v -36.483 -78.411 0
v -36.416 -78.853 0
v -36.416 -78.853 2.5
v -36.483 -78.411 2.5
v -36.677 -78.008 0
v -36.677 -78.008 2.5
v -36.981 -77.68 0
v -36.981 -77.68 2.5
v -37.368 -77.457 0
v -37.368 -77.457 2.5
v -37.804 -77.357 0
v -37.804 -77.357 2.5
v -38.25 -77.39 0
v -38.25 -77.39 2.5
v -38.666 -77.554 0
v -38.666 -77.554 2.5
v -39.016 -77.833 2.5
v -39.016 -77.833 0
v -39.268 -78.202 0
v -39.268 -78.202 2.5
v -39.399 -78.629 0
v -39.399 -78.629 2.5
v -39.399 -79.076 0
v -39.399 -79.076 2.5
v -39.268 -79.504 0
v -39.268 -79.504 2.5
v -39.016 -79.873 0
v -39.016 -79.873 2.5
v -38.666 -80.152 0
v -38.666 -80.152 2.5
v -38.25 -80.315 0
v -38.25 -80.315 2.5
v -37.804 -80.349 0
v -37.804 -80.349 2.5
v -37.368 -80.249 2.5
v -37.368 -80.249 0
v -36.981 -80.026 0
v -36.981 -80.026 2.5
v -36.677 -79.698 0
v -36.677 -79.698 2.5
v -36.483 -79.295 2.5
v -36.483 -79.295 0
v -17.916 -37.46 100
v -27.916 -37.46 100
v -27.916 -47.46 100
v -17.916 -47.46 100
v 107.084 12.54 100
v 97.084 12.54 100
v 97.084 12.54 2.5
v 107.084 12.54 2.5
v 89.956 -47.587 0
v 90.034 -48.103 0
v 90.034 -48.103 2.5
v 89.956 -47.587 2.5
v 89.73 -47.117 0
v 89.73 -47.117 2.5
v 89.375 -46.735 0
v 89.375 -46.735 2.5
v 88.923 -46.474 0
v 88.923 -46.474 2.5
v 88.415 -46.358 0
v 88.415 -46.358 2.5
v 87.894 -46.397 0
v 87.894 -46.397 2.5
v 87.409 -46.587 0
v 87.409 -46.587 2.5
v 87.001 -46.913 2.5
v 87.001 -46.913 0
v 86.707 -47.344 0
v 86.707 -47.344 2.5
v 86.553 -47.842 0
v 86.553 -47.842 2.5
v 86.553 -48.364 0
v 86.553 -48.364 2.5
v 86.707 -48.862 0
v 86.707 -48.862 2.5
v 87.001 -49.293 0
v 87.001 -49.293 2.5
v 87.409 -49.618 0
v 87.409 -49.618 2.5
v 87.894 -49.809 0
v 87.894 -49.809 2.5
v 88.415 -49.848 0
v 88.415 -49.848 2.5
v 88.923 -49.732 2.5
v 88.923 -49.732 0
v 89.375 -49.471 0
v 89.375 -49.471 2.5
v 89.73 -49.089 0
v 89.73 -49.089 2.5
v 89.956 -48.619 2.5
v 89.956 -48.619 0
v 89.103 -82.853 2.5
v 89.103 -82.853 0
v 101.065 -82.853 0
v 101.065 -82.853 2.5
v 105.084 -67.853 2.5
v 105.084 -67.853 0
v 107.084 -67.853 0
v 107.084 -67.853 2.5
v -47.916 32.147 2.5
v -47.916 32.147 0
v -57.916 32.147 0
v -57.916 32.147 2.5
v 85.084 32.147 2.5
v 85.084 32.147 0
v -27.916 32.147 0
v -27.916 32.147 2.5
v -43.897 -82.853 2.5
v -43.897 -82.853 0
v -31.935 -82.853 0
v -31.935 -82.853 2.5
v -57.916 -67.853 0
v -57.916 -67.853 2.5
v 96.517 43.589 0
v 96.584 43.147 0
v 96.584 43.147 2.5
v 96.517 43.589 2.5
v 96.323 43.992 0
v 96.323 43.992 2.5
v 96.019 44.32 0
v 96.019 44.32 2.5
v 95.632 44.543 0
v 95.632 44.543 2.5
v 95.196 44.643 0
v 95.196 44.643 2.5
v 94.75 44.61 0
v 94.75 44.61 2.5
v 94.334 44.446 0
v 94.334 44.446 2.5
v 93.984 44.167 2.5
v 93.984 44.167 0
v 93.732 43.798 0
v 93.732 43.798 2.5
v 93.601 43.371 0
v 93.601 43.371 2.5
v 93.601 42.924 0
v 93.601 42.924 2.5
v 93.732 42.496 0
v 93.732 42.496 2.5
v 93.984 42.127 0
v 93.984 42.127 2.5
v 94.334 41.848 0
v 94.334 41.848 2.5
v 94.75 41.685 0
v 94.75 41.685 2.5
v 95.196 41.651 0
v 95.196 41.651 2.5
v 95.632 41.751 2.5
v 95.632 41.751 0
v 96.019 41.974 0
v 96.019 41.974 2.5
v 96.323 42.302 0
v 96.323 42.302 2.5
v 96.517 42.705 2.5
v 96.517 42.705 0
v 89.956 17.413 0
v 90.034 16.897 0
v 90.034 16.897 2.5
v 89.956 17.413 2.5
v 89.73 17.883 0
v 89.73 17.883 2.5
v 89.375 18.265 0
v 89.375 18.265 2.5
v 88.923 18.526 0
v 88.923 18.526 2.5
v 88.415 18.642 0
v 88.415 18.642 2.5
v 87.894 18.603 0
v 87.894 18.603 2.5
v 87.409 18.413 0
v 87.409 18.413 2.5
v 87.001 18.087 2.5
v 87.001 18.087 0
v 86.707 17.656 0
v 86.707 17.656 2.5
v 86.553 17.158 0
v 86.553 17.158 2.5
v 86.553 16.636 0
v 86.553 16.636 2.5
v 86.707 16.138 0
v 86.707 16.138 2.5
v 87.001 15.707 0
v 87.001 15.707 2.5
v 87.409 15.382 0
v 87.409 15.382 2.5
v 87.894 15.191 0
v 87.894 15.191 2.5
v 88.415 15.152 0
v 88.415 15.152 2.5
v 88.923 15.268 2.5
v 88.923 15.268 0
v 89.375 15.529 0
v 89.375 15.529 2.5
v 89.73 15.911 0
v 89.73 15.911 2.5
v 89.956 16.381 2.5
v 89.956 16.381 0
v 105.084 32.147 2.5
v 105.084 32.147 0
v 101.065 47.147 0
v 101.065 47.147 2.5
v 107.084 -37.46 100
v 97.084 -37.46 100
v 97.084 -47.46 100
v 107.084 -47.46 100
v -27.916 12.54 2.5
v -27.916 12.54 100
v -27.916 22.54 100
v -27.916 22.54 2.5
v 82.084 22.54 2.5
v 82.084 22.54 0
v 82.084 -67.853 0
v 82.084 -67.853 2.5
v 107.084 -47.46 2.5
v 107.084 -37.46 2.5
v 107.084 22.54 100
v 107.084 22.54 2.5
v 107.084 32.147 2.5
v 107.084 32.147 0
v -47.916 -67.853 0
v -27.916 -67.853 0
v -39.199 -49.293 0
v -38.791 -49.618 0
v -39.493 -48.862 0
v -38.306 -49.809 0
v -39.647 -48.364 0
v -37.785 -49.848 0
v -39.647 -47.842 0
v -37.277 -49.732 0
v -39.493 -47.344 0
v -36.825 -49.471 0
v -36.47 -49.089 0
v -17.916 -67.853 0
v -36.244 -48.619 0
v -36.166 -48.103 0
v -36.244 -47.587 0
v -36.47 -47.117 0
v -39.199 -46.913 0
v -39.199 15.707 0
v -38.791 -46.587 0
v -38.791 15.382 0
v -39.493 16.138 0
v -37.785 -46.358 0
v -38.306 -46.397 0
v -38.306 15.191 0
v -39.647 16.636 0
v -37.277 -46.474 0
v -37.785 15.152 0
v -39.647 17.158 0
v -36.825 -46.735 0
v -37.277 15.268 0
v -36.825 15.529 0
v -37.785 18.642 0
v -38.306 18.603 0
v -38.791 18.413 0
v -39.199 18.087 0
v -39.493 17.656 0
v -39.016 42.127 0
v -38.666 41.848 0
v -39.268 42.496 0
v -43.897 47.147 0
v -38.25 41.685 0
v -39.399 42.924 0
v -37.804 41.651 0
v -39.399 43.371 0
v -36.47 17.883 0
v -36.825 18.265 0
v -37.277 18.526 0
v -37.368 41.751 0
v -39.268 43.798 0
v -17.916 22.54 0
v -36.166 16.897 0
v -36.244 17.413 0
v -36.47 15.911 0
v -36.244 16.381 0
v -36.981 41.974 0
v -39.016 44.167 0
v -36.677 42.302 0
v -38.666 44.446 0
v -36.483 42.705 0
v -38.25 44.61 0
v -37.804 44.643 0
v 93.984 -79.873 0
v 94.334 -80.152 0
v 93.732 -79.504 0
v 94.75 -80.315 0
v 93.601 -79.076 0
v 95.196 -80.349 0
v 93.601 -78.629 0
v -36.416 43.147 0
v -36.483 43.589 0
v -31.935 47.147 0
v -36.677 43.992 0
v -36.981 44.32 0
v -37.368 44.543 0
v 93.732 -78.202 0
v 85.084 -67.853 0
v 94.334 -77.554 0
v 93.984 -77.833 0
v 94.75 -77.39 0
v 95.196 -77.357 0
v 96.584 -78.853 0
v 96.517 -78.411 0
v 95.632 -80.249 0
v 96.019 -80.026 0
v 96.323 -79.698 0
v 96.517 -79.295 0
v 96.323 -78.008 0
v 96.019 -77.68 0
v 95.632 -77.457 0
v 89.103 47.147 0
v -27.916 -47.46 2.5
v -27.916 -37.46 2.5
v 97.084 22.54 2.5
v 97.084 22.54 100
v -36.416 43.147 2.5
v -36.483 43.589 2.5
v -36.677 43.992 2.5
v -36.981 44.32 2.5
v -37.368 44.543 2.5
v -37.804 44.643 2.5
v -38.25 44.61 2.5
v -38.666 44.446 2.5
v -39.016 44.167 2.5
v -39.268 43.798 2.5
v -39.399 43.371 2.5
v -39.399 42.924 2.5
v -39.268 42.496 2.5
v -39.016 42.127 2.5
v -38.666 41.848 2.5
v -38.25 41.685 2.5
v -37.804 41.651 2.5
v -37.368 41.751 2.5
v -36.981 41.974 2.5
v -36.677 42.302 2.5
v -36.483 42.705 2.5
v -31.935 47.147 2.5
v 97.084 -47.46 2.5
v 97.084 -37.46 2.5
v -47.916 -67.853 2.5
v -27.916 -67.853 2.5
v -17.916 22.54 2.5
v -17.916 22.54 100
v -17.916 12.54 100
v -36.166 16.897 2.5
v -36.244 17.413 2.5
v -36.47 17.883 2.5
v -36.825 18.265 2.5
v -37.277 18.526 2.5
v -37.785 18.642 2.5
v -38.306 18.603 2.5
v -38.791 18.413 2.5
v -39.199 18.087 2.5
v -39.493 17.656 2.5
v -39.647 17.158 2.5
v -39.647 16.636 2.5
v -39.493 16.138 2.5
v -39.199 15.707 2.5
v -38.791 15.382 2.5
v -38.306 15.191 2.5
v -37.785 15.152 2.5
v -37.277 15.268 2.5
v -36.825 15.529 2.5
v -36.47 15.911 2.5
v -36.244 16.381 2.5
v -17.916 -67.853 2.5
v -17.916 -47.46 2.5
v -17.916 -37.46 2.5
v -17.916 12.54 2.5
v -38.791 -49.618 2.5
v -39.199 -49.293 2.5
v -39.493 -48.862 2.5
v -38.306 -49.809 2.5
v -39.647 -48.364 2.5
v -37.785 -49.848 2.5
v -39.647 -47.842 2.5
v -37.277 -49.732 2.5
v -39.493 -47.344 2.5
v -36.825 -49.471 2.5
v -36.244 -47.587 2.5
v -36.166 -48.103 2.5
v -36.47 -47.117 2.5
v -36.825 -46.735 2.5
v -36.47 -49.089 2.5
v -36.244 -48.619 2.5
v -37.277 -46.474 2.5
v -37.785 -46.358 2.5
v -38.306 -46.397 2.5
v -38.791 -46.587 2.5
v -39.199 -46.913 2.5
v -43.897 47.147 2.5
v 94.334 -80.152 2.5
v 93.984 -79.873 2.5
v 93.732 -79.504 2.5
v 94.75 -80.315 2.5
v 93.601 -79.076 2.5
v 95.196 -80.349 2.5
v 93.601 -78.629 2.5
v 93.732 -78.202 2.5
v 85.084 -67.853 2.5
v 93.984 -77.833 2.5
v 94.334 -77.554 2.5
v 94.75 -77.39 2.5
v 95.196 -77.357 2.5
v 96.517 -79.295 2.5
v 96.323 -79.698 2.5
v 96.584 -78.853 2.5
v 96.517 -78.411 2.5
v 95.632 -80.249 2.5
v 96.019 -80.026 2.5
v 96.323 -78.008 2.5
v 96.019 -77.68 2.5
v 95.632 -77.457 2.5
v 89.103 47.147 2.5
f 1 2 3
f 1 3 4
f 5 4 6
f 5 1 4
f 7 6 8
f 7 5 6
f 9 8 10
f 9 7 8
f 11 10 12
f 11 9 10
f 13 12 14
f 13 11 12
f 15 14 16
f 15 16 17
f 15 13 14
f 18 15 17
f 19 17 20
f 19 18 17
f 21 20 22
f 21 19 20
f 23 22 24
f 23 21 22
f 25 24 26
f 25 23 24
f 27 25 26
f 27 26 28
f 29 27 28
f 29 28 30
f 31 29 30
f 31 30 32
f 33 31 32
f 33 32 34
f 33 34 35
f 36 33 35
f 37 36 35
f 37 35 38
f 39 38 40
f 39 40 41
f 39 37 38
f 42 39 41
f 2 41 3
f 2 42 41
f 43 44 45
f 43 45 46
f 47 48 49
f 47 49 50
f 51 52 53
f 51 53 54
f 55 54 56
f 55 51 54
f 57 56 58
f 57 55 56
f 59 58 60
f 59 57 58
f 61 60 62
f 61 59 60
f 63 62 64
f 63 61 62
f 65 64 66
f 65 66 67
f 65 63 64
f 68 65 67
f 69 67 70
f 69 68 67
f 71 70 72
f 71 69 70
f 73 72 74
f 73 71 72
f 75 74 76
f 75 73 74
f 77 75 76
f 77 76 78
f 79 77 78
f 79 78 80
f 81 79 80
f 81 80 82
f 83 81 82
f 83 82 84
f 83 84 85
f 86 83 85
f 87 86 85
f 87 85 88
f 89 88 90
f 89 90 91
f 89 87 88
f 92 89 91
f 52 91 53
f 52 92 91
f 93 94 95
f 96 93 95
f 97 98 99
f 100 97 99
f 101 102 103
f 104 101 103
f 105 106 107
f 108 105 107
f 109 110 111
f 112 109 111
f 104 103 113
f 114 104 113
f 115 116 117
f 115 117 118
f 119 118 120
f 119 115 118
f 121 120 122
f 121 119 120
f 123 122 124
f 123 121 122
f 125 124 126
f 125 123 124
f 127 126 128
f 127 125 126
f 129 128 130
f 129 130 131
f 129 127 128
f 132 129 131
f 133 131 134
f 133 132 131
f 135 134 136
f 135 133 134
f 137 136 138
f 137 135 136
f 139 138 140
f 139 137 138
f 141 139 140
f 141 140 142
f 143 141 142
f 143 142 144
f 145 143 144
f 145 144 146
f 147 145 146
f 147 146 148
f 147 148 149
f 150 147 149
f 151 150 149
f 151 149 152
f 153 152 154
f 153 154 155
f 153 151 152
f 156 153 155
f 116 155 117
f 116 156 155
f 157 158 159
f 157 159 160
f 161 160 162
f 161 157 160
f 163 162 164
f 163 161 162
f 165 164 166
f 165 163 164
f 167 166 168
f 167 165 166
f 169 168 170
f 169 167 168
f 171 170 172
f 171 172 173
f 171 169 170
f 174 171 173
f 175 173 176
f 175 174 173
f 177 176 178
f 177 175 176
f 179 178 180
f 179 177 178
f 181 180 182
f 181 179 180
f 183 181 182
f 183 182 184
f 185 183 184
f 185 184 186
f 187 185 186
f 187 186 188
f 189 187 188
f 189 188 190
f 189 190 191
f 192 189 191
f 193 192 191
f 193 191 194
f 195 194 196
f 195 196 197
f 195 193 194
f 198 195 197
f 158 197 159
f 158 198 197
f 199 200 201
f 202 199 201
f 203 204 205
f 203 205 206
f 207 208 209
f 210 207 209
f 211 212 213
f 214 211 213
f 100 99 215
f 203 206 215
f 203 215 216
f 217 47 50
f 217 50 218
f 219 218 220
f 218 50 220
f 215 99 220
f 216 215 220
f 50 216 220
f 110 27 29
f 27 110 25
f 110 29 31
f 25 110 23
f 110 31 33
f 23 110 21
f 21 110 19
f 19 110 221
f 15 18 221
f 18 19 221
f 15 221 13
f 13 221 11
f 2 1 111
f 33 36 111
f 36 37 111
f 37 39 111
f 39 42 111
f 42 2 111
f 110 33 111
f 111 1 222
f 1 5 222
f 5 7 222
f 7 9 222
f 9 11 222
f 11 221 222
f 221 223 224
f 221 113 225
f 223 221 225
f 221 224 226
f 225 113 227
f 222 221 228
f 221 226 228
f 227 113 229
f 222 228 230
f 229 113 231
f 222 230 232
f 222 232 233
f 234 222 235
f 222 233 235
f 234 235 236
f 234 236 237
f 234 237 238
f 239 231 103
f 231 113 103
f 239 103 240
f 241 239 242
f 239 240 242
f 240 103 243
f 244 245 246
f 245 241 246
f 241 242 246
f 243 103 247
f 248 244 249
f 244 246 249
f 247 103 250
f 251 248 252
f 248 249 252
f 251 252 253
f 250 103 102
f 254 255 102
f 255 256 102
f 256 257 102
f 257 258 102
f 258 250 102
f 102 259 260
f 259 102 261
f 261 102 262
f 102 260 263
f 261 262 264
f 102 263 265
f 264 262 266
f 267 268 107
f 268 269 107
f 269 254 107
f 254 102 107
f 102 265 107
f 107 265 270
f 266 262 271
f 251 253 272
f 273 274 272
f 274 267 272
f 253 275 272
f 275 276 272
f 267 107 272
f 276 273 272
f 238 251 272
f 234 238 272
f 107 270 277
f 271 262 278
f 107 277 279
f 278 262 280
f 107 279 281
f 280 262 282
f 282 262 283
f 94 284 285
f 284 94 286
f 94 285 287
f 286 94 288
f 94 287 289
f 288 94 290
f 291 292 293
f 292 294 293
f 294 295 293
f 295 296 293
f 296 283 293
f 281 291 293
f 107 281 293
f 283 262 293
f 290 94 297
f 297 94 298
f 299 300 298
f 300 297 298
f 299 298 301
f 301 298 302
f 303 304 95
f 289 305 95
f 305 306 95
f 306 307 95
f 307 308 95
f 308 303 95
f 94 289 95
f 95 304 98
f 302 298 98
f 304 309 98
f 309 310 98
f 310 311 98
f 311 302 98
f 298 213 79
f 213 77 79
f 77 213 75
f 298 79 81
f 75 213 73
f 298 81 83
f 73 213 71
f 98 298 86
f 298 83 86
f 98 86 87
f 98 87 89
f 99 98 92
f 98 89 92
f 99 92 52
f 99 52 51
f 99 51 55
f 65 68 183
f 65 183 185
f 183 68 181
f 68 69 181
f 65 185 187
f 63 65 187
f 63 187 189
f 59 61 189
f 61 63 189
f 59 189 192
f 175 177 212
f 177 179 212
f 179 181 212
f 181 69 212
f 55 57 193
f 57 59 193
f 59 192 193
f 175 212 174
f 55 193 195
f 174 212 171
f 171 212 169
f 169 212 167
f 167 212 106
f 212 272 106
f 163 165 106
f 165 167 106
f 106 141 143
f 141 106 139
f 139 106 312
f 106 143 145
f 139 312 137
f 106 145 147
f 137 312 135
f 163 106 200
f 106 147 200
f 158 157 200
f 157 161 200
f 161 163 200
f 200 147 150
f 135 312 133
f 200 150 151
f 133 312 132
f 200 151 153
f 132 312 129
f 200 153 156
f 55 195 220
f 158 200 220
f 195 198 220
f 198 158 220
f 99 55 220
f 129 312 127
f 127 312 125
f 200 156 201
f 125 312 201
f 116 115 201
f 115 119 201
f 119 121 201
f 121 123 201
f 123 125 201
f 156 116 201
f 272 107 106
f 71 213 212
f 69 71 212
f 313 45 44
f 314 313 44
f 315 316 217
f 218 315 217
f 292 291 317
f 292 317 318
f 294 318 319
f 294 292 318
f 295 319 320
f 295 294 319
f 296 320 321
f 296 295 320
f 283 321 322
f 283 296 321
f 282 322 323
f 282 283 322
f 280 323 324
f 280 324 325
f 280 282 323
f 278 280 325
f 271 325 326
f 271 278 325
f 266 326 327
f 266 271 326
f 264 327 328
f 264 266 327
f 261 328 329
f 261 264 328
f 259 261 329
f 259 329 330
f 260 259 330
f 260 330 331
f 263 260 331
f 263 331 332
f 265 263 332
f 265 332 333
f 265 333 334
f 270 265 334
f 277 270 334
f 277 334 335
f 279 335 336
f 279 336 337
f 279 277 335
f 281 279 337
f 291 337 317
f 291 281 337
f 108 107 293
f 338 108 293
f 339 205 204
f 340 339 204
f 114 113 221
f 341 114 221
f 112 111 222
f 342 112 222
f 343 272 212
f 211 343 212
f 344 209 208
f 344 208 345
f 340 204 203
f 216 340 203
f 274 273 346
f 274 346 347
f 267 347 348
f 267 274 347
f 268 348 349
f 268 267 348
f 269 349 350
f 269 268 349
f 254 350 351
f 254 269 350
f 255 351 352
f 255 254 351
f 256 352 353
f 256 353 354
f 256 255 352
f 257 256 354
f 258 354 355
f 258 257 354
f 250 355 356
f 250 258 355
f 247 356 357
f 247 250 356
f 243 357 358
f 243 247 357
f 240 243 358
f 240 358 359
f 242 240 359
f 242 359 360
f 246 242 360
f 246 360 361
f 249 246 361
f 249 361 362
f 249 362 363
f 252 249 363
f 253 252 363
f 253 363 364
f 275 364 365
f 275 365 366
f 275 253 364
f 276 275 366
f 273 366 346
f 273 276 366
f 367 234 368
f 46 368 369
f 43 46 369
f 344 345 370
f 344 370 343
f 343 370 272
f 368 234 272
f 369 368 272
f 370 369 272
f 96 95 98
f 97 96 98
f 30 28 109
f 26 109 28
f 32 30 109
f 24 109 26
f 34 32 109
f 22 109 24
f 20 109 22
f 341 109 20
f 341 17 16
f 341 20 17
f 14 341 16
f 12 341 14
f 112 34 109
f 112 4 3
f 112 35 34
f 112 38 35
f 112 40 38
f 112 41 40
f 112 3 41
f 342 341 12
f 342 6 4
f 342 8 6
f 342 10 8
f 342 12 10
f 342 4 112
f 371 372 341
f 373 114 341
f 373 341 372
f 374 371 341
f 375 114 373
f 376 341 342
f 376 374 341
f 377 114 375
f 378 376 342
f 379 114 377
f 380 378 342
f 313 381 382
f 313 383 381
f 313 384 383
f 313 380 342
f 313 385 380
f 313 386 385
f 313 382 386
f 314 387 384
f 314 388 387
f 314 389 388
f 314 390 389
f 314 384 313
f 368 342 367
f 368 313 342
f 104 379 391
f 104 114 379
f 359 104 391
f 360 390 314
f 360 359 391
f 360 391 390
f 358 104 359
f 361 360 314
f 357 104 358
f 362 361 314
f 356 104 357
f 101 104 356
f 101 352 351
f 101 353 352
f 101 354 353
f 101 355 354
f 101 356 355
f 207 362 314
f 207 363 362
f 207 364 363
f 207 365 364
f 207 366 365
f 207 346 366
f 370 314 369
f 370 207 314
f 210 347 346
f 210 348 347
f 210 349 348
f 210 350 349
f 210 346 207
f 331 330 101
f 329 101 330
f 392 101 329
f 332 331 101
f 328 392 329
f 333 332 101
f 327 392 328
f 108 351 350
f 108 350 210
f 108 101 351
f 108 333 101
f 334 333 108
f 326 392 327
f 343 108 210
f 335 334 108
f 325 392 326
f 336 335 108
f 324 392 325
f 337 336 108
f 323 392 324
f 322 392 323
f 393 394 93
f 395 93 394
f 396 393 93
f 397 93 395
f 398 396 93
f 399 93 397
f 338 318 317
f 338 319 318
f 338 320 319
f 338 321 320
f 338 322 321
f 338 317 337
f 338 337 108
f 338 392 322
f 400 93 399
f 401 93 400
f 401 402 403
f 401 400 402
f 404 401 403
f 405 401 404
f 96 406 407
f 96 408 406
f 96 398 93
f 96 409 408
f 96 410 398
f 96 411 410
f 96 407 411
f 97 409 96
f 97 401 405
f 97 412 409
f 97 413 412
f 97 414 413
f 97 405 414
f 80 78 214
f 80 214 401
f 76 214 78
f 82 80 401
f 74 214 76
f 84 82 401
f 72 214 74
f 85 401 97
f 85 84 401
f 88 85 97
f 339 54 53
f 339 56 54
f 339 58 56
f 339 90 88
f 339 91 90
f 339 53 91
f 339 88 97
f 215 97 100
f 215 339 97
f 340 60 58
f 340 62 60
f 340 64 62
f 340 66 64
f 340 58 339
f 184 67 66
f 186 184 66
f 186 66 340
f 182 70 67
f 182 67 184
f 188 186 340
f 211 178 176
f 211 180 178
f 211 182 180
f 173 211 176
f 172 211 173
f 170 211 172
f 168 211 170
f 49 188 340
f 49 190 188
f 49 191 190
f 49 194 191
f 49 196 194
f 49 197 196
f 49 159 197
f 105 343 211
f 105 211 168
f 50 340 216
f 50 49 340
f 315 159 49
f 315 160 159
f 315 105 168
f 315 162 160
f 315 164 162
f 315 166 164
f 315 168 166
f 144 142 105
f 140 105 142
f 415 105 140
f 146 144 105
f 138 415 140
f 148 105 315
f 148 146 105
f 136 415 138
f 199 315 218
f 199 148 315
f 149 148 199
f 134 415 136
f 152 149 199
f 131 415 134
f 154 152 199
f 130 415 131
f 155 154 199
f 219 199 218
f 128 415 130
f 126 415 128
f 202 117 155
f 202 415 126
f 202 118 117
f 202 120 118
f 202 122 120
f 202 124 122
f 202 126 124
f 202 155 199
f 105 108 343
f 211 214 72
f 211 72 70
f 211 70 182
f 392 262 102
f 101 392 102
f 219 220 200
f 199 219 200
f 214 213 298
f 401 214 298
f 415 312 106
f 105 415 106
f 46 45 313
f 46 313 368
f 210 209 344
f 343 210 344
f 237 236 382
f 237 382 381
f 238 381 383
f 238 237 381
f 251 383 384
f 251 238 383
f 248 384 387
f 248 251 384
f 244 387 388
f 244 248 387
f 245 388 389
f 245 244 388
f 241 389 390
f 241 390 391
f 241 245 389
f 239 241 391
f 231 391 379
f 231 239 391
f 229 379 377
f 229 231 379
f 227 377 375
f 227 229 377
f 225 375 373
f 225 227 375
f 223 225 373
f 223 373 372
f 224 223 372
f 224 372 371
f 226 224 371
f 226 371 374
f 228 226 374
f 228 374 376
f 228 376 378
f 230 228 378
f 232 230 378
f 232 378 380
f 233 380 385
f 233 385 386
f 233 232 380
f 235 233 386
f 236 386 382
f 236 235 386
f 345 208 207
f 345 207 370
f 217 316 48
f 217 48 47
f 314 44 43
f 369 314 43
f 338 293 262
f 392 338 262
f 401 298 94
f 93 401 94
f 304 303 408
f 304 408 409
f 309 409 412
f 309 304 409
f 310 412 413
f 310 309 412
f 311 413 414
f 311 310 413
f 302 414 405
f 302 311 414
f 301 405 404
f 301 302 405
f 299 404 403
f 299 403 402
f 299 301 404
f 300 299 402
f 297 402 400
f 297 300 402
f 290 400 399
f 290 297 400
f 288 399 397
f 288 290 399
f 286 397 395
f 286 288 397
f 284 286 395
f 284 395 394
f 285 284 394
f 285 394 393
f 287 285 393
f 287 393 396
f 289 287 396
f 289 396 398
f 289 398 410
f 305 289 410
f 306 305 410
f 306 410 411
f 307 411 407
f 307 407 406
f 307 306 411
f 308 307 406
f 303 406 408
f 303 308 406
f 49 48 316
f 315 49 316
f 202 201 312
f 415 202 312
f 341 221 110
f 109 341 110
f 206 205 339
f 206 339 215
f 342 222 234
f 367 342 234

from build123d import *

# Parameters (mm, degrees)
F0_R     = 1.5
F0_R_2   = 1.75
F1_DEPTH = 2.5
F0_W     = 10
F0_H     = 10
F2_DEPTH = 100


# Not quite as in the source:
# - a feature names something its author has since deleted; it is built from what else it names


with BuildPart() as f1:
    # F0 (on Top) → F1 (new body)
    with BuildSketch(Plane.XY):
        Polygon((105.08390221, -67.8528748304), (85.08390221, -67.8528748304), (89.1031400965, -82.8528748304), (101.0646643235, -82.8528748304), align=None)
        with Locations((95.08390221, -78.8528748304)):
            Circle(F0_R, mode=Mode.SUBTRACT)
        Polygon((-47.91609779, 32.1471251696), (-57.91609779, 32.1471251696), (-57.91609779, -67.8528748304), (-47.91609779, -67.8528748304), (-27.91609779, -67.8528748304), (-17.91609779, -67.8528748304), (-17.91609779, -47.4599613249), (-27.91609779, -47.4599613249), (-27.91609779, -37.4599613249), (-17.91609779, -37.4599613249), (-17.91609779, 12.5400386751), (-27.91609779, 12.5400386751), (-27.91609779, 22.5400386751), (-17.91609779, 22.5400386751), (82.08390221, 22.5400386751), (97.08390221, 22.5400386751), (107.08390221, 22.5400386751), (107.08390221, 32.1471251696), (105.08390221, 32.1471251696), (85.08390221, 32.1471251696), (-27.91609779, 32.1471251696), align=None)
        with Locations((-37.91609779, -48.1028748304)):
            Circle(F0_R_2, mode=Mode.SUBTRACT)
        with Locations((-37.91609779, 16.8971251696)):
            Circle(F0_R_2, mode=Mode.SUBTRACT)
        Polygon((-27.91609779, -67.8528748304), (-47.91609779, -67.8528748304), (-43.8968599035, -82.8528748304), (-31.9353356765, -82.8528748304), align=None)
        with Locations((-37.91609779, -78.8528748304)):
            Circle(F0_R, mode=Mode.SUBTRACT)
        Polygon((-43.8968599035, 47.1471251696), (-47.91609779, 32.1471251696), (-27.91609779, 32.1471251696), (-31.9353356765, 47.1471251696), align=None)
        with Locations((-37.91609779, 43.1471251696)):
            Circle(F0_R, mode=Mode.SUBTRACT)
        Polygon((89.1031400965, 47.1471251696), (85.08390221, 32.1471251696), (105.08390221, 32.1471251696), (101.0646643235, 47.1471251696), align=None)
        with Locations((95.08390221, 43.1471251696)):
            Circle(F0_R, mode=Mode.SUBTRACT)
        Polygon((82.08390221, 12.5400386751), (82.08390221, -67.8528748304), (85.08390221, -67.8528748304), (105.08390221, -67.8528748304), (107.08390221, -67.8528748304), (107.08390221, -47.4599613249), (97.08390221, -47.4599613249), (97.08390221, -37.4599613249), (107.08390221, -37.4599613249), (107.08390221, 12.5400386751), (97.08390221, 12.5400386751), (97.08390221, 22.5400386751), (82.08390221, 22.5400386751), align=None)
        with Locations((88.28390221, -48.1028748304)):
            Circle(F0_R_2, mode=Mode.SUBTRACT)
        with Locations((88.28390221, 16.8971251696)):
            Circle(F0_R_2, mode=Mode.SUBTRACT)
    extrude(amount=F1_DEPTH)

    # F0 (on Top) → F2 (join)
    with BuildSketch(Plane.XY):
        with Locations((-22.91609779, 17.5400386751)):
            Rectangle(F0_W, F0_H)
        with Locations((102.08390221, 17.5400386751)):
            Rectangle(F0_W, F0_H)
        with Locations((102.08390221, -42.4599613249)):
            Rectangle(F0_W, F0_H)
        with Locations((-22.91609779, -42.4599613249)):
            Rectangle(F0_W, F0_H)
    extrude(amount=F2_DEPTH)


solid = f1.part
